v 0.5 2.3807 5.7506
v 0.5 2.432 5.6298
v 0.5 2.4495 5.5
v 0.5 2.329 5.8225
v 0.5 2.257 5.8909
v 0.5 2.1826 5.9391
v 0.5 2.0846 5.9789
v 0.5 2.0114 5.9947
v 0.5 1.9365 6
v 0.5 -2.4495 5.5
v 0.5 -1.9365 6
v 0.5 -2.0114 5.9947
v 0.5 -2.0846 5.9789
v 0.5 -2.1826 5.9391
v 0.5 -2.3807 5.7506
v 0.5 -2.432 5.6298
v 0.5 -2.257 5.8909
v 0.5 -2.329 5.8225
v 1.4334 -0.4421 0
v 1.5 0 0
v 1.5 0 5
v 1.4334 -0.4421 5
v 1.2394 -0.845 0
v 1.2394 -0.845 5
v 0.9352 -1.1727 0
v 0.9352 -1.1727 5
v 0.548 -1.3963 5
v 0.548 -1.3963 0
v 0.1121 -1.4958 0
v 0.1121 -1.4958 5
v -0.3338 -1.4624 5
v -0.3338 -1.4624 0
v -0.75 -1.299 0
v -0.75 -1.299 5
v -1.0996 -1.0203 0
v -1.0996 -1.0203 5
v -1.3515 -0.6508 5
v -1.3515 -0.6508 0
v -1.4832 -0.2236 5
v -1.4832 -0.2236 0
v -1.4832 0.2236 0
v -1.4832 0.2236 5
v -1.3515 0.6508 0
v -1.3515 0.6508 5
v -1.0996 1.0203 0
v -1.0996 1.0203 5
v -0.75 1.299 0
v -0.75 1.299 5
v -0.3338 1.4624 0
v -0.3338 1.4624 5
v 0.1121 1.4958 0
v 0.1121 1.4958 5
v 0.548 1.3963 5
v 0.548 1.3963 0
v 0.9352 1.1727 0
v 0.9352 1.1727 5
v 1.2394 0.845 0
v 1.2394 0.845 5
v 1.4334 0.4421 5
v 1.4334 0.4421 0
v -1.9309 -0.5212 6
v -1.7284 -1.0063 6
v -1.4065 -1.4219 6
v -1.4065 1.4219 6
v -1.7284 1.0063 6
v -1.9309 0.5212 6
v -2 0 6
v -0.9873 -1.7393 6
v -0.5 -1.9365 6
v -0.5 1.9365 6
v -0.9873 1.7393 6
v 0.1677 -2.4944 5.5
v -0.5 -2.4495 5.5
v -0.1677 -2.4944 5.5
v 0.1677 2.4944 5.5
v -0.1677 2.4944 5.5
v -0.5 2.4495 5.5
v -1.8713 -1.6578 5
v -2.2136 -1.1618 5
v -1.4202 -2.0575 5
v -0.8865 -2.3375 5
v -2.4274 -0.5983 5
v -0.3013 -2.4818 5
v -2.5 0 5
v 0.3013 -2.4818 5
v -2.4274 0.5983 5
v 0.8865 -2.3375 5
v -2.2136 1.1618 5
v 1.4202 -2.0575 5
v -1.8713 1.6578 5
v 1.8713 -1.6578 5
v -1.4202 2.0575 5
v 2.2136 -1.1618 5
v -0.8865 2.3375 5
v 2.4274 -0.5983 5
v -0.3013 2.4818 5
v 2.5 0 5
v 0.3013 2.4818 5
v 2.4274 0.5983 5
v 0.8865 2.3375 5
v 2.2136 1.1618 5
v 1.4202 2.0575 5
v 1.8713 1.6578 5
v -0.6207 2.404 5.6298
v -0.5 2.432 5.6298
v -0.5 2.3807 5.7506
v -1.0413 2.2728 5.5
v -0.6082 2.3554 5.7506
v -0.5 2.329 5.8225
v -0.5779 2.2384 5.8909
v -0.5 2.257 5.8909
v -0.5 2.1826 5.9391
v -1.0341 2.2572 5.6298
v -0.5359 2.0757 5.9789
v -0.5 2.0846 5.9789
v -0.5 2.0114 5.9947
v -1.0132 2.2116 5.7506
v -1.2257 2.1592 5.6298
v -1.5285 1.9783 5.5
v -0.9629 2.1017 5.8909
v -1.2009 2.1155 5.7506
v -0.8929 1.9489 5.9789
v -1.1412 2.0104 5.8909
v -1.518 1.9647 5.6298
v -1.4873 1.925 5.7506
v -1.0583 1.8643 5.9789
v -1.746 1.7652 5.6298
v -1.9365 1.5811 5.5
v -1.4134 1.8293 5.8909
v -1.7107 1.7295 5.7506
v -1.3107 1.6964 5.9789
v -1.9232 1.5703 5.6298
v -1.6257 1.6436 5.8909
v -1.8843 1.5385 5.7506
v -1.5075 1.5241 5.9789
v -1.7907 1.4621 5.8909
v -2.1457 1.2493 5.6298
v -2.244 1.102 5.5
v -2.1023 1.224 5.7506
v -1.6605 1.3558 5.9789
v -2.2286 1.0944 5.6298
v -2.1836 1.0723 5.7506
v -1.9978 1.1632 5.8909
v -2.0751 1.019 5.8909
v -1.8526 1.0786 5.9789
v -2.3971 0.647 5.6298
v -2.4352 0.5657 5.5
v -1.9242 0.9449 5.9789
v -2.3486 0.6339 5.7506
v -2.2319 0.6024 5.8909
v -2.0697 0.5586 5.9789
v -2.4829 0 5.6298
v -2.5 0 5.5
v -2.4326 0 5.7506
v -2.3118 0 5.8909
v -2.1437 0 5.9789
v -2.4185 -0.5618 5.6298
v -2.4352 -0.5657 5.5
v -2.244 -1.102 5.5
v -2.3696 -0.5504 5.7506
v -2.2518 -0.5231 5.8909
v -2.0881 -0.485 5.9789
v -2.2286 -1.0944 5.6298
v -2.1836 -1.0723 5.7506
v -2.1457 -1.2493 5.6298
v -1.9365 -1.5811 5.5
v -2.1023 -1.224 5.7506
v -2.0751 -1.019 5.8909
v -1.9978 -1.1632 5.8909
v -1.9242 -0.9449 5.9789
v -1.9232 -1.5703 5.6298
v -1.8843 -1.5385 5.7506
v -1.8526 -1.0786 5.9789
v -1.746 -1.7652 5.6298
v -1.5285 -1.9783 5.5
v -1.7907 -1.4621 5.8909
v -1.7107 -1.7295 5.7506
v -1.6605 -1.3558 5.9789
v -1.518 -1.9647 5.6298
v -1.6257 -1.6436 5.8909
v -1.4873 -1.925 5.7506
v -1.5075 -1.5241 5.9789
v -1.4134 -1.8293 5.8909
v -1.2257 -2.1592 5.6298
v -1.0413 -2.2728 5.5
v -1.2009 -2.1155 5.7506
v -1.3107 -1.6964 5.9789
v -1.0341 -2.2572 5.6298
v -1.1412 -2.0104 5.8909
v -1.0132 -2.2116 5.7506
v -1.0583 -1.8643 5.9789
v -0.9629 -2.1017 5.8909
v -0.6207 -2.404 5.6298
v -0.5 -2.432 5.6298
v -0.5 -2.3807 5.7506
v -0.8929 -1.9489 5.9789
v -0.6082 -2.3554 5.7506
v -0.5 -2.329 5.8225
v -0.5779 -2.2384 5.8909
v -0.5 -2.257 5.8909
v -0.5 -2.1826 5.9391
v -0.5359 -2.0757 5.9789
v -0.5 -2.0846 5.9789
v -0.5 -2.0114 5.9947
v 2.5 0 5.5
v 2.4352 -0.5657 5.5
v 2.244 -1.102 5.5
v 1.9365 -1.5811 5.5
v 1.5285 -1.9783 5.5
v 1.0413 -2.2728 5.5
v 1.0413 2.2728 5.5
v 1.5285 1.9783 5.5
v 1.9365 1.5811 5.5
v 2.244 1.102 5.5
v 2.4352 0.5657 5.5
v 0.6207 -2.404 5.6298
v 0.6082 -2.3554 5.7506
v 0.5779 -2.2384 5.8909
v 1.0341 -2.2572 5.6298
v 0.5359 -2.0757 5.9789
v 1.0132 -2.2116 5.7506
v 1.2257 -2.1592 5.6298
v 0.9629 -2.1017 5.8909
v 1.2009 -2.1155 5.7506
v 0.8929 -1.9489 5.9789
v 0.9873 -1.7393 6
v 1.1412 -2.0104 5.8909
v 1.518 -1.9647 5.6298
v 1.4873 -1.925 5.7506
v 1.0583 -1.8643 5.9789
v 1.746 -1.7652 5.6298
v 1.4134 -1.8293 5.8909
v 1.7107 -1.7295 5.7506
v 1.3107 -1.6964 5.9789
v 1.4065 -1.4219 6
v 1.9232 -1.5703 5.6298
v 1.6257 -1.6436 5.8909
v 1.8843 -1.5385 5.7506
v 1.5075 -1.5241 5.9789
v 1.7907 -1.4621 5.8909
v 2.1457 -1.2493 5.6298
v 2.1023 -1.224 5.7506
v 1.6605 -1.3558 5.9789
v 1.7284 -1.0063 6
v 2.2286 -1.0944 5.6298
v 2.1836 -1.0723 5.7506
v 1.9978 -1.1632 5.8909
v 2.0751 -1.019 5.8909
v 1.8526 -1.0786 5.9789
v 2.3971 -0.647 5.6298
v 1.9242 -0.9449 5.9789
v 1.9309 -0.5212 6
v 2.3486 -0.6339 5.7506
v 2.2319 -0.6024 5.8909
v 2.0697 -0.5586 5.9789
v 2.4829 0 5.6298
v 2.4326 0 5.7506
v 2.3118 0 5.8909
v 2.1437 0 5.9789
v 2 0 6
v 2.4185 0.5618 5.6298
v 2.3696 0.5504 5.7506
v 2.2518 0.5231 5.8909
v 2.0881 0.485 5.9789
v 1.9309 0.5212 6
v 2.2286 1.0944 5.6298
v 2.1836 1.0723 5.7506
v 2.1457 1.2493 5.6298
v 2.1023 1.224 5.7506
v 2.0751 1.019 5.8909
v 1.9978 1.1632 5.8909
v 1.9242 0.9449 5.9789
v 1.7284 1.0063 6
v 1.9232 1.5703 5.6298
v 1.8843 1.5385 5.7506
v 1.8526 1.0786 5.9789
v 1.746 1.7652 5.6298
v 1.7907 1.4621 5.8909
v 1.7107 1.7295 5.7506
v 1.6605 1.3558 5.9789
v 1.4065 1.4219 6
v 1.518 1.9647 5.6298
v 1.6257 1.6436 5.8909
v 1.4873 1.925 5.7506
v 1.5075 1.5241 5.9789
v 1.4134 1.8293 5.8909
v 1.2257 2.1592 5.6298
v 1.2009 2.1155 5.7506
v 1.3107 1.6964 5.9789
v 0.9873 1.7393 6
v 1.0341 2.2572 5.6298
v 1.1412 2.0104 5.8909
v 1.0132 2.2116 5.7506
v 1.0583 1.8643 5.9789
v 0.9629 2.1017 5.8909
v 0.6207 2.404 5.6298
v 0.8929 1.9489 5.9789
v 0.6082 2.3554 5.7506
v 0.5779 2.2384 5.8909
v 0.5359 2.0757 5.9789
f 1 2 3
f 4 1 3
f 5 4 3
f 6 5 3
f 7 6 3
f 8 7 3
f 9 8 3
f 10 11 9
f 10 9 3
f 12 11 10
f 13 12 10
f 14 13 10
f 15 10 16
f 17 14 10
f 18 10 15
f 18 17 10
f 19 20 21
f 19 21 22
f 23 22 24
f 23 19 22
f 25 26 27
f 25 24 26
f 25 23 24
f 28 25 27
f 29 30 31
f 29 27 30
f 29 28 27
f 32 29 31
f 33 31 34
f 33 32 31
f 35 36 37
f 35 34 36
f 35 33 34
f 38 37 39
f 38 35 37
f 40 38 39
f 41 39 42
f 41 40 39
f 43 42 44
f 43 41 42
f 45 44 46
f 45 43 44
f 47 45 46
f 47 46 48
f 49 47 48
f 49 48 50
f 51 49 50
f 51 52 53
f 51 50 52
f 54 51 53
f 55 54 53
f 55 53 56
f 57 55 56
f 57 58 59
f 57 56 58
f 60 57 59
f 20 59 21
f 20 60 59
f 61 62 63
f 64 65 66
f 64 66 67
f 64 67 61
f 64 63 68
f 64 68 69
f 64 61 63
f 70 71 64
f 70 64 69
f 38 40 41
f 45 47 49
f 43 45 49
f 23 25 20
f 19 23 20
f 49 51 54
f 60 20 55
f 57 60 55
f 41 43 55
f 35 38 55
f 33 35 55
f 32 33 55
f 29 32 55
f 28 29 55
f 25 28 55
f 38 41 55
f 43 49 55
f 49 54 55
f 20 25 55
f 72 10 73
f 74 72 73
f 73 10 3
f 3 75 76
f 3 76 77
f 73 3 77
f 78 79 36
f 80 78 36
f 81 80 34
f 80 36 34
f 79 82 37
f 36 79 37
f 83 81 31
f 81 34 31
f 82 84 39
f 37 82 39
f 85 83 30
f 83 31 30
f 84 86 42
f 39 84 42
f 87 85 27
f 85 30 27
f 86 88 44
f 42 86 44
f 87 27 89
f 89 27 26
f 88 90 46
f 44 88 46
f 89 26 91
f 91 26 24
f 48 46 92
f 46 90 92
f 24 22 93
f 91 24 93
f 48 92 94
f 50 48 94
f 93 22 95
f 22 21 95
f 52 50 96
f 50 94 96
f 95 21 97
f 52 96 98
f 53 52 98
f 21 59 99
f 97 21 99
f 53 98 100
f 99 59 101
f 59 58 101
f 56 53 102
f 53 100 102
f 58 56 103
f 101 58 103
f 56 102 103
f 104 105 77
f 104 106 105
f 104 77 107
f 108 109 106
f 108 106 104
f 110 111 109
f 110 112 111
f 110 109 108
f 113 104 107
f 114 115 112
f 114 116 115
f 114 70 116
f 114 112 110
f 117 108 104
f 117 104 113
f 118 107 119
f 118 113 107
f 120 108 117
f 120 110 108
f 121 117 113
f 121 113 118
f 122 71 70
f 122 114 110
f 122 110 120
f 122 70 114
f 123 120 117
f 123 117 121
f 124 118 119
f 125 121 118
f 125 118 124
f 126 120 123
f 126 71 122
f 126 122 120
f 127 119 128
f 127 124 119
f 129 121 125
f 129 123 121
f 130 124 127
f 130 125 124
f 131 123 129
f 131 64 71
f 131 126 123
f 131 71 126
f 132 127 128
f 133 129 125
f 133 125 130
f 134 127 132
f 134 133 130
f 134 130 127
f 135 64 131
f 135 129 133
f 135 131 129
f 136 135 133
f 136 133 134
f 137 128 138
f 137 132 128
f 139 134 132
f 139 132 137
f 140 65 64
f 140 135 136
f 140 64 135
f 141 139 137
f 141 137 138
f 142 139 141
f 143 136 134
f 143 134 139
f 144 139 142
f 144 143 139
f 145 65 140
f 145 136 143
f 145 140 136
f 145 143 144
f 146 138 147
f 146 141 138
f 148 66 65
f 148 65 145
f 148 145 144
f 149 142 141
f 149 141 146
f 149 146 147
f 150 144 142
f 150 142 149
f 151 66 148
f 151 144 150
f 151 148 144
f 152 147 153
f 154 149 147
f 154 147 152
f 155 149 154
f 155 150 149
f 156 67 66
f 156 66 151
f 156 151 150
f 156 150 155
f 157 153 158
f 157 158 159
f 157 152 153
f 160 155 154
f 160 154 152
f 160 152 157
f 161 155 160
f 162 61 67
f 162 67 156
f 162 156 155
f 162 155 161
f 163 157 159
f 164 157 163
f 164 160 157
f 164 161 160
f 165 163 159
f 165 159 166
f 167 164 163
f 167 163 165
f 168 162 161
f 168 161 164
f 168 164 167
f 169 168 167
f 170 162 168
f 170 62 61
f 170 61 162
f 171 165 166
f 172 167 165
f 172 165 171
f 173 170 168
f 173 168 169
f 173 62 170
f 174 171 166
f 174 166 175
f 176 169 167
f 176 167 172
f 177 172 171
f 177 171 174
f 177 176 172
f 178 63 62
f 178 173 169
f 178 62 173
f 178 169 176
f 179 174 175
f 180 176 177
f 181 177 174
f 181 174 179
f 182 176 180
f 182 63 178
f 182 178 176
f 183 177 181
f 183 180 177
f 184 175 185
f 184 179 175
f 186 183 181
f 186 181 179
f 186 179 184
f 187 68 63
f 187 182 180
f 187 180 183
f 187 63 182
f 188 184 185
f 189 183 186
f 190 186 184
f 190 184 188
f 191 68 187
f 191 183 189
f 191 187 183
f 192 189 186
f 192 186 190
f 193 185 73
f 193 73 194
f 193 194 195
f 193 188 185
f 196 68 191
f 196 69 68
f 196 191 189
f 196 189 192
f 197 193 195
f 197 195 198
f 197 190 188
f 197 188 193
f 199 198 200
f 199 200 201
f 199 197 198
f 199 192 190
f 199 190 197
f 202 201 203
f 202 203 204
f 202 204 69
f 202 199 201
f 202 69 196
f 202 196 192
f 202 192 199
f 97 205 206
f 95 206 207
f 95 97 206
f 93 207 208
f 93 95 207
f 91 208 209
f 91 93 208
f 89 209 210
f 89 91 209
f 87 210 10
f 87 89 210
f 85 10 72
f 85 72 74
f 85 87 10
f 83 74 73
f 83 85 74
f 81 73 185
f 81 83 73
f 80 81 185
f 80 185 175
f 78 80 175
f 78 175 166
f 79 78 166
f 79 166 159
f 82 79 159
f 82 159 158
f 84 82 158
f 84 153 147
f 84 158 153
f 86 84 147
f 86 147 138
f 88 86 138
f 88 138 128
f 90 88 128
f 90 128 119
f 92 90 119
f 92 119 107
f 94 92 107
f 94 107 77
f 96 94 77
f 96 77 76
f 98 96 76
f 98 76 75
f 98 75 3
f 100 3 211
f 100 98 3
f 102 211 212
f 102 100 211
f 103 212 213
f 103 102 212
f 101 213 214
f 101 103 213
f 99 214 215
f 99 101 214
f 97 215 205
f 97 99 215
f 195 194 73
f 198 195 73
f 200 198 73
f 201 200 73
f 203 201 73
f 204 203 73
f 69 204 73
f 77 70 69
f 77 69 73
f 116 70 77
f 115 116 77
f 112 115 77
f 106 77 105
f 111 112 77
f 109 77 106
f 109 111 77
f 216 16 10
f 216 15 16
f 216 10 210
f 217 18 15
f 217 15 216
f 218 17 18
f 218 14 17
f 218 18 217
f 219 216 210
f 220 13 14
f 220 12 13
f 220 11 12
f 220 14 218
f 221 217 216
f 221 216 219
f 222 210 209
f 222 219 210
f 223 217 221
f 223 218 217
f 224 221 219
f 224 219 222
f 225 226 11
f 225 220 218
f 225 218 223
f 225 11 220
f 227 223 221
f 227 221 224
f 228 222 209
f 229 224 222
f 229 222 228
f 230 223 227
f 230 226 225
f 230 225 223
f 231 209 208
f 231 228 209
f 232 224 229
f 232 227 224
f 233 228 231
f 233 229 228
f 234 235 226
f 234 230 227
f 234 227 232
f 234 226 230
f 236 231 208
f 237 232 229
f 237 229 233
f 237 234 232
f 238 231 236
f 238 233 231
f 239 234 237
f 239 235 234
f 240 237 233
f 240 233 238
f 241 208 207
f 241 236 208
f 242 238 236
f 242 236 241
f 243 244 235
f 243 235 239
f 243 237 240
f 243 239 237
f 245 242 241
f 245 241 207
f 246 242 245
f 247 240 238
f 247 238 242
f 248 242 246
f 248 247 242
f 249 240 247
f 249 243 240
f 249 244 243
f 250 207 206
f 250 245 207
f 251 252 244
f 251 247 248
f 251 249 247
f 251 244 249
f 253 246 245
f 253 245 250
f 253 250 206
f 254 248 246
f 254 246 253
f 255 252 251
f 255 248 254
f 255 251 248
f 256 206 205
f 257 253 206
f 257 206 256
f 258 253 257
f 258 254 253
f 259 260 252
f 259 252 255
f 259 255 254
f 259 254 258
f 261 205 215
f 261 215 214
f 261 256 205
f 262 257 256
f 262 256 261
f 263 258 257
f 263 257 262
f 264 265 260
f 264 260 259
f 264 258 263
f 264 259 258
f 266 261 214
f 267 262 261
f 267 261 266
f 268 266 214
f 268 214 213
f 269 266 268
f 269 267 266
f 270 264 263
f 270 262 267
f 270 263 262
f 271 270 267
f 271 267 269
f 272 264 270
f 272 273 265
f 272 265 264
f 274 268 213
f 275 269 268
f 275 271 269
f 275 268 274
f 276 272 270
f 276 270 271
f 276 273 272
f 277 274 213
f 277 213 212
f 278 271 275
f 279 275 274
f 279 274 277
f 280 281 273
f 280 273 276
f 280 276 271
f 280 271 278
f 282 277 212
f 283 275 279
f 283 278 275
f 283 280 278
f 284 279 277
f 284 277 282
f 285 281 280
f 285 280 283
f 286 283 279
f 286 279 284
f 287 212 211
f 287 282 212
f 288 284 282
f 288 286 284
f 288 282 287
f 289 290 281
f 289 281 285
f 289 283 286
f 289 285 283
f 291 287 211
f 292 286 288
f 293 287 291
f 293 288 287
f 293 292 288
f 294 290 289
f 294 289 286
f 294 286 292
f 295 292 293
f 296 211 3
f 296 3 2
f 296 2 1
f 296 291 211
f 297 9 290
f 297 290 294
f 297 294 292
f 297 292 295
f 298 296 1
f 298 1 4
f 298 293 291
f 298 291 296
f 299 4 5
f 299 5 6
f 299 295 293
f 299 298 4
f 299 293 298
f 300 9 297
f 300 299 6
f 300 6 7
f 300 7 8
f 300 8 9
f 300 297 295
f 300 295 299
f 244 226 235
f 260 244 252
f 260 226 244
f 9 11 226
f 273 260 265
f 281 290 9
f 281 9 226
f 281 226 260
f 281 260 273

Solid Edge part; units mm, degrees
sketch "Sketch1" plane through (0, 0, 0) normal (0, 0, 1) x (1, 0, 0)
  circle A0 centre (0, 0) radius 1.5
  dimension "D1" = 3
extrude "Protrusion1" add sketch "Sketch1" along normal blind 5
sketch "Sketch2" plane through (0, 0, 5) normal (0, 0, 1) x (1, 0, 0)
  circle A0 centre (0, 0) radius 2.5
  dimension "D1" = 5
extrude "Head" add sketch "Sketch2" along normal blind 1
fillet "Round___Head" radius 0.5 1 edges at (-2.5, 0, 6)
sketch "Sketch3" plane through (0, 0, 6) normal (0, 0, 1) x (1, 0, 0)
  line L0 (-0.5, -2.4495) -> (-0.5, 2.4495)
  line L1 (0.5, 2.4495) -> (0.5, -2.4495)
  arc A0 (0.5, -2.4495) -> (-0.5, -2.4495) centre (0, 0) cw
  arc A1 (-0.5, 2.4495) -> (0.5, 2.4495) centre (0, 0) cw
extrude "Cutout___Head" cut sketch "Sketch3" against normal blind 0.5
cosmetic_thread "Thread1" size "M3"
properties material "Stainless Steel, 420"
